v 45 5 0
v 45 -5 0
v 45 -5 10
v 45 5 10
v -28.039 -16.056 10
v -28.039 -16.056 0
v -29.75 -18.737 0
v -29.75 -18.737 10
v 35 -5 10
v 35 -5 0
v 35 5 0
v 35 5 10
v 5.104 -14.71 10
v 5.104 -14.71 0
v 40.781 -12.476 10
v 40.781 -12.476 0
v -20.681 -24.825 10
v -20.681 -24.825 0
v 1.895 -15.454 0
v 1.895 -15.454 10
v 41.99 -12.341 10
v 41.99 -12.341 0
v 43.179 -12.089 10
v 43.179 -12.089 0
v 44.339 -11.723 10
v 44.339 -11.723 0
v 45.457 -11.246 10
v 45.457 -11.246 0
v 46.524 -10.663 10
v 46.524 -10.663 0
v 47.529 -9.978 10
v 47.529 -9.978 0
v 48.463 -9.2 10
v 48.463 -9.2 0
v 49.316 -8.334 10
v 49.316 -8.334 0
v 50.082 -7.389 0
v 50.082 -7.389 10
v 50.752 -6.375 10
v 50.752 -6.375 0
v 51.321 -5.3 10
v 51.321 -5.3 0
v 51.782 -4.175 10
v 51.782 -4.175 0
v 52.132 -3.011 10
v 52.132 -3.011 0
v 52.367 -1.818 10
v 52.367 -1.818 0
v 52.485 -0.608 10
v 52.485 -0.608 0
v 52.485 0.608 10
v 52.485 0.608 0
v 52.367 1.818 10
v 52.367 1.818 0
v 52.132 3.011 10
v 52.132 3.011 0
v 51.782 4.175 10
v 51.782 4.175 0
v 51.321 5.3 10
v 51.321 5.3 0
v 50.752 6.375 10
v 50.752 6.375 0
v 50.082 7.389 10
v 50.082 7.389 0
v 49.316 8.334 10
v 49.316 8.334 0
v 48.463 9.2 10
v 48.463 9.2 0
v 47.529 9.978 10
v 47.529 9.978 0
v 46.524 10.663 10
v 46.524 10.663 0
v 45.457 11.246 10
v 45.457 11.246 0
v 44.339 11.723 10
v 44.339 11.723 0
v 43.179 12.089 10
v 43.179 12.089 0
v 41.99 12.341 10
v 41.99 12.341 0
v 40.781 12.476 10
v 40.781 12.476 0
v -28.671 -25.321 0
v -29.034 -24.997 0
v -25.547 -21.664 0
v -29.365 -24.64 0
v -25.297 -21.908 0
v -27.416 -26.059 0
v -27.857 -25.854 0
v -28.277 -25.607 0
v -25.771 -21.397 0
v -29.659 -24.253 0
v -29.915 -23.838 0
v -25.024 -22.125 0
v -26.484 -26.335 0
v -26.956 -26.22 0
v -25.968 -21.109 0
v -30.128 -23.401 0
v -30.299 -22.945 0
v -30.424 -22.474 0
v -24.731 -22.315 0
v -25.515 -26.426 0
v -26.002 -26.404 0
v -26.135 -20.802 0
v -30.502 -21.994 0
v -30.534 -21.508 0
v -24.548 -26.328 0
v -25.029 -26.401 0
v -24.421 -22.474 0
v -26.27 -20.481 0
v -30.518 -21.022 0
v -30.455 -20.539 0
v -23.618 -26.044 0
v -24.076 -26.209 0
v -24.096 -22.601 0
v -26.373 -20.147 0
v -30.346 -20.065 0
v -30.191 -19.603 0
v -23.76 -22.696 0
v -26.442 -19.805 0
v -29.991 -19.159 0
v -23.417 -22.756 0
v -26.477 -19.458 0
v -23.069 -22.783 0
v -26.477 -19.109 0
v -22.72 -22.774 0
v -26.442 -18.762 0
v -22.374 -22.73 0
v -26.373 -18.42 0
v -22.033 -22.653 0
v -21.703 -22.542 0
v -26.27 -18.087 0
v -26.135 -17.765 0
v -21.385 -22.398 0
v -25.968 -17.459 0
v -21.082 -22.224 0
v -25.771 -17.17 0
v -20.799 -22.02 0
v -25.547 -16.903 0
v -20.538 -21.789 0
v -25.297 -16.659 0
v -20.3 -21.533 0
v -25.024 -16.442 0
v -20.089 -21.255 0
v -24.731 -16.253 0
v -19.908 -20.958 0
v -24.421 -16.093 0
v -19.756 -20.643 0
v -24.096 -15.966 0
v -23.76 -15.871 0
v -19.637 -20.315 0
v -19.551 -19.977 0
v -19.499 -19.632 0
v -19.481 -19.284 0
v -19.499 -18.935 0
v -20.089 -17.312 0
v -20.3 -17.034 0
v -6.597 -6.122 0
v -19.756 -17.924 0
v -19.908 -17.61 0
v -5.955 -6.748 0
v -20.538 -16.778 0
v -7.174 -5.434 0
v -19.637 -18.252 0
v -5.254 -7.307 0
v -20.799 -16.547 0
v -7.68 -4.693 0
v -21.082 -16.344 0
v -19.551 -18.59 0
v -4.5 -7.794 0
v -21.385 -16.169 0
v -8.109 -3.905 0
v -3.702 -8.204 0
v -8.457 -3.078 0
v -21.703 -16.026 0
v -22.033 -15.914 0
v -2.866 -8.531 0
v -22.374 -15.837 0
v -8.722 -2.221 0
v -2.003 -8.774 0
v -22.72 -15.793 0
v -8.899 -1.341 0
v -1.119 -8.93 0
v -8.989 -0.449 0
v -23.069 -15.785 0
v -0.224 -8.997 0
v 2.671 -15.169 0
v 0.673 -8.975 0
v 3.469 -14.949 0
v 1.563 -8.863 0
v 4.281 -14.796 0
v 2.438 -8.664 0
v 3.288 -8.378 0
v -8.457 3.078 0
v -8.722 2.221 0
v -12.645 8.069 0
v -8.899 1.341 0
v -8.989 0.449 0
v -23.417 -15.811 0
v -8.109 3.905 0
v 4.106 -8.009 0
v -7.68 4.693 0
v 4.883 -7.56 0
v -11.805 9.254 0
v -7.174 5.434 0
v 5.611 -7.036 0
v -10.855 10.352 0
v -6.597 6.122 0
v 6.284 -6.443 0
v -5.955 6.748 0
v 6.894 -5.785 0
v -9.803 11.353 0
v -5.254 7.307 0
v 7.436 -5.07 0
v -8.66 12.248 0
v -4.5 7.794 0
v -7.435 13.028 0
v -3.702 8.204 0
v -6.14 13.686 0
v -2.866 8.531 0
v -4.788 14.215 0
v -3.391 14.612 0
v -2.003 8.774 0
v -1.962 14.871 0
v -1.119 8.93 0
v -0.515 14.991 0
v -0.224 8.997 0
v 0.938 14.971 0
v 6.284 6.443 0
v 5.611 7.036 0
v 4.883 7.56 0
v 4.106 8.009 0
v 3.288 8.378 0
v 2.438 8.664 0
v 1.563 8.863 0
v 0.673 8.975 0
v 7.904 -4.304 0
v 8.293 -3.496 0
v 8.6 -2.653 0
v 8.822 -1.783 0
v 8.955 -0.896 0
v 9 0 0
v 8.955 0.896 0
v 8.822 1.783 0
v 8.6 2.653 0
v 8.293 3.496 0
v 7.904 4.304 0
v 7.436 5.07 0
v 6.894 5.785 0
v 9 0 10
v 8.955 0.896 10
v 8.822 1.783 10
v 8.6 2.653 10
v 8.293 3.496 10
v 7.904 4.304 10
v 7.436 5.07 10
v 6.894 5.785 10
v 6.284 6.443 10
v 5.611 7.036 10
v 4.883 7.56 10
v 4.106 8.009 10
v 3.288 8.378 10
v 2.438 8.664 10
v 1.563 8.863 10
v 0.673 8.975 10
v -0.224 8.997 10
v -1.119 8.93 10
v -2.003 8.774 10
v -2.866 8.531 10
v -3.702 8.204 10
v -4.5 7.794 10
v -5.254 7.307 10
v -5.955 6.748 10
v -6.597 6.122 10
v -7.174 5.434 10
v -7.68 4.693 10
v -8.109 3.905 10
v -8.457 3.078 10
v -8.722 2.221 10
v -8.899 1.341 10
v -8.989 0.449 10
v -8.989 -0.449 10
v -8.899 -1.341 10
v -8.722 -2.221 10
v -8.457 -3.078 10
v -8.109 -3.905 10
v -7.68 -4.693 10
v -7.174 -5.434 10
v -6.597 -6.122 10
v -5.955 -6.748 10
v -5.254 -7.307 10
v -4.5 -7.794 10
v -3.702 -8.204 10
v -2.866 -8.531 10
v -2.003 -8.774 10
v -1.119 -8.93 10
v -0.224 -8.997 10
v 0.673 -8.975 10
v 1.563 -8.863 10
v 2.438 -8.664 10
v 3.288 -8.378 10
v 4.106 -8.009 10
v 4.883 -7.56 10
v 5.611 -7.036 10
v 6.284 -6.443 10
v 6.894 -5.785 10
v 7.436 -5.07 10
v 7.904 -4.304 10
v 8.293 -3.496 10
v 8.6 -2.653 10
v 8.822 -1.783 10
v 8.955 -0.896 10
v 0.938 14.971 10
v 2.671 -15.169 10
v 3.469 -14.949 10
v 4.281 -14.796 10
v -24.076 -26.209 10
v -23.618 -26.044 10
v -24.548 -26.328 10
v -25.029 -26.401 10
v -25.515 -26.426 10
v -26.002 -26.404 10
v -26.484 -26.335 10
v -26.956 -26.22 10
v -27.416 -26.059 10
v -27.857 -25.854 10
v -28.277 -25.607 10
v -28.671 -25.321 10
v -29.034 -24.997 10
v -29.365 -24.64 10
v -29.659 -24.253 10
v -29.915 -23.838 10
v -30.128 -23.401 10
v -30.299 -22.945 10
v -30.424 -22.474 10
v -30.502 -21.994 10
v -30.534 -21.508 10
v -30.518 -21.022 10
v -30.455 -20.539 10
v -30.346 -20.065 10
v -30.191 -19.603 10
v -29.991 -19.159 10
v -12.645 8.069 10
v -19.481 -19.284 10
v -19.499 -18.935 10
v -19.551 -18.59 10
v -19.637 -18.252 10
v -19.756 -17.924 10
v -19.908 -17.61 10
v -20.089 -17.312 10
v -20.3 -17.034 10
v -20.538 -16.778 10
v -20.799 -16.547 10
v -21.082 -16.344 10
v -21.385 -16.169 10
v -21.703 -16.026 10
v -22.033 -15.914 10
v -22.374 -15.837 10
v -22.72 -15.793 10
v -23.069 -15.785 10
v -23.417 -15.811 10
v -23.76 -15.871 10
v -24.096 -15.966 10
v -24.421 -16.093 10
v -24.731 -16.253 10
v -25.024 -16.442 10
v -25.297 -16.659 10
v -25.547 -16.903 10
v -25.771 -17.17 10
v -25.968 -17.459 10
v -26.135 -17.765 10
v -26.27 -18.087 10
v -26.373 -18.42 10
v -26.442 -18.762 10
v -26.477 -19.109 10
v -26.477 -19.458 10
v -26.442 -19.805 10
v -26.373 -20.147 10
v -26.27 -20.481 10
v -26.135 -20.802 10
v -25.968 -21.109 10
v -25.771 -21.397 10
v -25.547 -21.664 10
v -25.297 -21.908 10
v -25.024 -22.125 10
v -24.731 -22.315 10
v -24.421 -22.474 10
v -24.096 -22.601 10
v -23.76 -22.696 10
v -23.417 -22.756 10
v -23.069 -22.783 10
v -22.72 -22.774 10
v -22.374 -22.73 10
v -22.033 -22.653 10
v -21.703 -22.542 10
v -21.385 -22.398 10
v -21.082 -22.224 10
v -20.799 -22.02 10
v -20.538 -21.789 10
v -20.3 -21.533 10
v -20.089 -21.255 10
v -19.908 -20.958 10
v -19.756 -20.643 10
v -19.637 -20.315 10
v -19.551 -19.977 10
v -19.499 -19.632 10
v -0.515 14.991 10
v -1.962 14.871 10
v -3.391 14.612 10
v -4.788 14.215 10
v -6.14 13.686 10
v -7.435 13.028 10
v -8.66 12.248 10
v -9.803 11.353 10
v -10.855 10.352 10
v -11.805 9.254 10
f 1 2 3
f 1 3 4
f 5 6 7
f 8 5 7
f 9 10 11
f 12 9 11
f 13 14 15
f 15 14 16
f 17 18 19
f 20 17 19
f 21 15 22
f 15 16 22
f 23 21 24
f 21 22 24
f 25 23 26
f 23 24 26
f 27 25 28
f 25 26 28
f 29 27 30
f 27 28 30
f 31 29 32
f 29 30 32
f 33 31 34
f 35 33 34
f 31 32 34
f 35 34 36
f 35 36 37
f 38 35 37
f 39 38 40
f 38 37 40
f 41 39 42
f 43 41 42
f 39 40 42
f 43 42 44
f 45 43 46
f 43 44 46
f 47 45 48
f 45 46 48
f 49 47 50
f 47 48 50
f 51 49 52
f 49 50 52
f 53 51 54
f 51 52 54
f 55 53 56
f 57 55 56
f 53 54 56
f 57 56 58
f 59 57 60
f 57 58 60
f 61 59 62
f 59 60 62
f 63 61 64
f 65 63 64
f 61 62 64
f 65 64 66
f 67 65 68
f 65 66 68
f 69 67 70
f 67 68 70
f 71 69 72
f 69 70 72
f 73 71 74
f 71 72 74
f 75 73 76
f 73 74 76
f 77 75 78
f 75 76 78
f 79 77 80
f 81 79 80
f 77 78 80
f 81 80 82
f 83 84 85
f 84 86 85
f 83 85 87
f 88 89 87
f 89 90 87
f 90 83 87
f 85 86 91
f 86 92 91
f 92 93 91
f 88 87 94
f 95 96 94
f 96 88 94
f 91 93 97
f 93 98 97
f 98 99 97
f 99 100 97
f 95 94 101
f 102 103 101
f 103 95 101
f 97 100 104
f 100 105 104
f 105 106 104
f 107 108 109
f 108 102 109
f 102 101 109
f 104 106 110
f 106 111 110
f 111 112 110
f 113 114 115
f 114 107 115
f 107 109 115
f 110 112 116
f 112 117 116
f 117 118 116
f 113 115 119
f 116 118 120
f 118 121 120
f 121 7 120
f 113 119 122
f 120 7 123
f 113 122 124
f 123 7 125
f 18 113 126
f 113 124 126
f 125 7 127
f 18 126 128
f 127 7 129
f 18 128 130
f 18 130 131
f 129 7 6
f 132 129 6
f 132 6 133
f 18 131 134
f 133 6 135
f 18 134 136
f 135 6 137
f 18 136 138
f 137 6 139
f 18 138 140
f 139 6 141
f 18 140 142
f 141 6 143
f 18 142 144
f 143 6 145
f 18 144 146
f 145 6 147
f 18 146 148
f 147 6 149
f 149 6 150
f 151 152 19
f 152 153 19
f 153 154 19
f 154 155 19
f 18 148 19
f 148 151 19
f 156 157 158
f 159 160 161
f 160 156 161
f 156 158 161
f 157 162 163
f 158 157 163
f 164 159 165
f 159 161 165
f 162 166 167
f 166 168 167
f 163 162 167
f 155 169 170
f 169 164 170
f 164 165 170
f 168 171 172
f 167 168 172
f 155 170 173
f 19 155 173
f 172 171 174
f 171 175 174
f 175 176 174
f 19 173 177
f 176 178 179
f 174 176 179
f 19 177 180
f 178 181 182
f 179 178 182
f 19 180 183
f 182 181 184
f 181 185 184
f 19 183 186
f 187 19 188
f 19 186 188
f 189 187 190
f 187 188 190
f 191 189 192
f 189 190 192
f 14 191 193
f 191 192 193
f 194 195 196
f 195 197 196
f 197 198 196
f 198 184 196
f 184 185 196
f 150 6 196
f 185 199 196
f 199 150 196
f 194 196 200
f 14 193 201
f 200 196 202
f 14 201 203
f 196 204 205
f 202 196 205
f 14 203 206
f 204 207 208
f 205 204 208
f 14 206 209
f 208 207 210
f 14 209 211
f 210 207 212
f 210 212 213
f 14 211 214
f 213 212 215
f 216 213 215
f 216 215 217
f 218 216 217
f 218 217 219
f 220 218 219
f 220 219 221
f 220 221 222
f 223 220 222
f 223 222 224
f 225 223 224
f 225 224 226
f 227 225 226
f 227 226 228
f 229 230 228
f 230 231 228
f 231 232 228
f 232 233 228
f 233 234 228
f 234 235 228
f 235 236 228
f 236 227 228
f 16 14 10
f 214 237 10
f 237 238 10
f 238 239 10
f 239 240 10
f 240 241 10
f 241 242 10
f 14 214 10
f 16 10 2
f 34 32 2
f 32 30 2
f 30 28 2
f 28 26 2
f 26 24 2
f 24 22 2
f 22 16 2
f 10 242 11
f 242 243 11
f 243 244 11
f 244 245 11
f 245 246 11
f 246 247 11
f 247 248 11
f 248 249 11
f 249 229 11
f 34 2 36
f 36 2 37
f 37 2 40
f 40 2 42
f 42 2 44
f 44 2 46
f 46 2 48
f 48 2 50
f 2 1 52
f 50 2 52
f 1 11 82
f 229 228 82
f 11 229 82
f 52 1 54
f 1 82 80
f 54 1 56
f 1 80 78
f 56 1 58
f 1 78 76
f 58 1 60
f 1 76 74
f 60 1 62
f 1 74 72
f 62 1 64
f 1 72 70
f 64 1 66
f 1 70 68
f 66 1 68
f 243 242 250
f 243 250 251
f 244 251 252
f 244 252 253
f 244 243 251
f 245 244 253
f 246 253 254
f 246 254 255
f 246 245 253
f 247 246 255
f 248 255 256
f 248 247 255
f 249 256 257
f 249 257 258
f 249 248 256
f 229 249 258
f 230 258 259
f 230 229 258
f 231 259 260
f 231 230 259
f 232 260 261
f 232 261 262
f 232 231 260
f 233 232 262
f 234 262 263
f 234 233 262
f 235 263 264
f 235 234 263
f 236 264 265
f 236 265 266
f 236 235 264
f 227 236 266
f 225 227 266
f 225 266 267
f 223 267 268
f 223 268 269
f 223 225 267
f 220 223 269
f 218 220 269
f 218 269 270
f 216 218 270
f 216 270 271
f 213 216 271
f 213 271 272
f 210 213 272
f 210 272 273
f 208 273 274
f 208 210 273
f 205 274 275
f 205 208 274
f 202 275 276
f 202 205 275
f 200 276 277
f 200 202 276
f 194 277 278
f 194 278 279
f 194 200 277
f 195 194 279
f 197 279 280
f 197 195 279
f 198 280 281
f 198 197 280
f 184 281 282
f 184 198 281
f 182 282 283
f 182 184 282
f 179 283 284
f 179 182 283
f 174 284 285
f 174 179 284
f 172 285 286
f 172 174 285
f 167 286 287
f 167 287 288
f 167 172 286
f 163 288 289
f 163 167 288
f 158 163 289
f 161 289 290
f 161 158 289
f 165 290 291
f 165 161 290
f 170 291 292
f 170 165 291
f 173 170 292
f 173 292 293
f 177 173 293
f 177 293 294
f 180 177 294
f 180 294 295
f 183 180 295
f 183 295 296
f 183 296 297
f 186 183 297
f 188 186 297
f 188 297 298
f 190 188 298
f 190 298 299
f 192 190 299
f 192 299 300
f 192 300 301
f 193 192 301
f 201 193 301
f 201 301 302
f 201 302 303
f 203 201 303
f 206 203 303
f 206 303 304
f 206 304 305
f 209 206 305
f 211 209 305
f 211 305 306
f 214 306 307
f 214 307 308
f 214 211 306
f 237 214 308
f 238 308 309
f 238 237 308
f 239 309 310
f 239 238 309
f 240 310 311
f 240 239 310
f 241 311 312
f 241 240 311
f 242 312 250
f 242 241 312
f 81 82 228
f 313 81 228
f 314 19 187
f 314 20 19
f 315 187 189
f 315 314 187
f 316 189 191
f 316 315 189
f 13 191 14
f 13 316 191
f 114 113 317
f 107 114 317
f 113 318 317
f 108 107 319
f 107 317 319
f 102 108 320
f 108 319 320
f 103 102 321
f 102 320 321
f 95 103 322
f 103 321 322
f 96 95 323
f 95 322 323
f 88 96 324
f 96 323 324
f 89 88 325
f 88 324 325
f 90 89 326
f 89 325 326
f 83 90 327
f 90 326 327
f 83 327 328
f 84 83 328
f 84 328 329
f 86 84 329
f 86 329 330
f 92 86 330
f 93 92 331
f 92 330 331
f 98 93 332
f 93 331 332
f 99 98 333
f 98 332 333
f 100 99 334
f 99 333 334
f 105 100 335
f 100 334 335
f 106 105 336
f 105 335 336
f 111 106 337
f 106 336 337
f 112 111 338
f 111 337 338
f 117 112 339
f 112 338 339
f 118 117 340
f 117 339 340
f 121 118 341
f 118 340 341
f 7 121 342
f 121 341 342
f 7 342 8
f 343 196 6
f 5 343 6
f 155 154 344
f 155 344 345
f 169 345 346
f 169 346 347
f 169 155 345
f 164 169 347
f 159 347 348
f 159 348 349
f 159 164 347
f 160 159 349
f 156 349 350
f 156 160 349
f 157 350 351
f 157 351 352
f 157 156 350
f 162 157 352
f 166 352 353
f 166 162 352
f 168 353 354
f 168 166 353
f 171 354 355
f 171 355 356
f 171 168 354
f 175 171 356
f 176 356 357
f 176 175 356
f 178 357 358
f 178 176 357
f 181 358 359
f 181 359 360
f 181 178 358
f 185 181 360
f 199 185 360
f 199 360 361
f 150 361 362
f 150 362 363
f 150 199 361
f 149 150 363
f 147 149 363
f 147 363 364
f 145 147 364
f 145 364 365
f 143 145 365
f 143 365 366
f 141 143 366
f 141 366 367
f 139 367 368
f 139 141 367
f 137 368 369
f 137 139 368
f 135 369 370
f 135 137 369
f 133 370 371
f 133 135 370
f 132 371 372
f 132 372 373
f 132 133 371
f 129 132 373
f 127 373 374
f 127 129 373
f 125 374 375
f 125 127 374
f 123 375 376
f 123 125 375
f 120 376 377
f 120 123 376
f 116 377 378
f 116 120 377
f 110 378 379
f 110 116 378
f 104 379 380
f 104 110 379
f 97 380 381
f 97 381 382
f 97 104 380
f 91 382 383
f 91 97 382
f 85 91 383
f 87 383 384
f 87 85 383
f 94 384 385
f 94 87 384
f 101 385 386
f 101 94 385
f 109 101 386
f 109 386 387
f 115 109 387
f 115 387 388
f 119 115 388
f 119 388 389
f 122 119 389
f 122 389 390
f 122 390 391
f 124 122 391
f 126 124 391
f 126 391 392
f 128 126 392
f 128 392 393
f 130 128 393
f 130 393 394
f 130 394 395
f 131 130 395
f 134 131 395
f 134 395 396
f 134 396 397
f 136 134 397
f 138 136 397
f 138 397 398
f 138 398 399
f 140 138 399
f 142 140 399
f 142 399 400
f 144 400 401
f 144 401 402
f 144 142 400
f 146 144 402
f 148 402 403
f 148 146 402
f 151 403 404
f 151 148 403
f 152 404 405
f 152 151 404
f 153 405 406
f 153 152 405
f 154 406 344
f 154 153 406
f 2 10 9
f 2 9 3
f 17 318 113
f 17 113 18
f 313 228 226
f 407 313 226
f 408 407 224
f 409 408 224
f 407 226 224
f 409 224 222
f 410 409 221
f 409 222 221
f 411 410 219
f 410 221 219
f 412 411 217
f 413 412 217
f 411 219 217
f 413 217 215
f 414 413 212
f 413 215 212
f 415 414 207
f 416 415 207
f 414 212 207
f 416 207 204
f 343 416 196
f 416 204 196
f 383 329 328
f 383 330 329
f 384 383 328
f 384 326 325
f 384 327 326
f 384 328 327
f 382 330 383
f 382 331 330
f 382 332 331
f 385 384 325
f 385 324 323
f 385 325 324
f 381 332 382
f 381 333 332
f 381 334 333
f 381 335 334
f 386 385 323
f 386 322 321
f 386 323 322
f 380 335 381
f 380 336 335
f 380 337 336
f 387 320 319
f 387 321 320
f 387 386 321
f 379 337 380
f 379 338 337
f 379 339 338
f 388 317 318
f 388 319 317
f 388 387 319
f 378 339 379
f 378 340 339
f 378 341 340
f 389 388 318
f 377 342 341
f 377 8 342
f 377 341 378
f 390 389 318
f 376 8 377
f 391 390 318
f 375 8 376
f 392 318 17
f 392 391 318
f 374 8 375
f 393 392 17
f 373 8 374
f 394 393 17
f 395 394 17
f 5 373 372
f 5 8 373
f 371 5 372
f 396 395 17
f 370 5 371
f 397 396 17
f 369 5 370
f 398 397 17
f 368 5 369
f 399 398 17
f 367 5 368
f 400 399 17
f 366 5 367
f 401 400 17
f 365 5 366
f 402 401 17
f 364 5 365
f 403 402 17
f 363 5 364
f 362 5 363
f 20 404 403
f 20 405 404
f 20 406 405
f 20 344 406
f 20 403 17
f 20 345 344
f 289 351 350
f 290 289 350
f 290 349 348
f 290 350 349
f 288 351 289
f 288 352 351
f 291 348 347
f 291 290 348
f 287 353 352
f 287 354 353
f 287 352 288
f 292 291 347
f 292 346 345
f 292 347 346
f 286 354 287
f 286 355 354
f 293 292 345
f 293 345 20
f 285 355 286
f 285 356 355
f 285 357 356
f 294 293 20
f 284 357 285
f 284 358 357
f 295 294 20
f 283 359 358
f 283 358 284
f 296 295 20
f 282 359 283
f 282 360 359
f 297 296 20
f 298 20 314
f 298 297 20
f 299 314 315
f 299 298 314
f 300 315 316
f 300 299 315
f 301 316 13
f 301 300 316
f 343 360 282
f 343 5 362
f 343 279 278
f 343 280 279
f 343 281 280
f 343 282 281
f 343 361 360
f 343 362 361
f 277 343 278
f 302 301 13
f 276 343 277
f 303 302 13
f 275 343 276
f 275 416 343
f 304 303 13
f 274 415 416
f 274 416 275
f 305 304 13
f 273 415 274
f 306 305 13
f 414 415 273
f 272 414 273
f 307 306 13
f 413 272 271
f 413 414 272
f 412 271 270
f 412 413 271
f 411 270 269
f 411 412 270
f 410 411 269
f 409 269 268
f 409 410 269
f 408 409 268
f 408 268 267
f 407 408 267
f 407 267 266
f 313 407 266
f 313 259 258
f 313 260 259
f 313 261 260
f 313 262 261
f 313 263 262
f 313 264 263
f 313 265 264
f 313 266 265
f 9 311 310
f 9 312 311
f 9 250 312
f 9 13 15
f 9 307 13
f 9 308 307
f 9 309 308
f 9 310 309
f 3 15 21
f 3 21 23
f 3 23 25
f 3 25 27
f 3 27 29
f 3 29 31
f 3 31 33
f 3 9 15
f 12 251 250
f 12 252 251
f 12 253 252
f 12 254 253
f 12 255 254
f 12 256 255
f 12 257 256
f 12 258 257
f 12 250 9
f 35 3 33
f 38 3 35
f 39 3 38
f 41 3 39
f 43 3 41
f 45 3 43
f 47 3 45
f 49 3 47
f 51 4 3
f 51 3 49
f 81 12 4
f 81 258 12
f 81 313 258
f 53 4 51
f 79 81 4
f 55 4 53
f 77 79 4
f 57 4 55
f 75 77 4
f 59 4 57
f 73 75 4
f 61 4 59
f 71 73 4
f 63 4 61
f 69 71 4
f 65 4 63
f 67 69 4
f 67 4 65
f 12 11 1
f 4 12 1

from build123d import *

# Parameters (mm, degrees)
SKETCH_1_R      = 6
SKETCH_1_R_2    = 3.5
SKETCH_1_R_3    = 15
SKETCH_1_R_4    = 9
SKETCH_1_R_5    = 12.5
SKETCH_1_W      = 10
SKETCH_1_H      = 10
EXTRUDE_1_DEPTH = 10
FILLET_1_R      = 5
FILLET_2_R      = 10


with BuildPart() as part:
    # Эскиз1 → Бобышка-Вытянуть1 (new body)
    # profile 1 of 7: a face of its own
    with BuildSketch(Plane.XY):
        with BuildLine():
            Line((-12.64490448, 8.068853121), (-28.039295072, -16.056087022))
            ThreePointArc((-28.039295072, -16.056087022), (-21.300228103, -13.523950753), (-16.981333294, -19.283628291))
            ThreePointArc((-16.981333294, -19.283628291), (-17.991282662, -22.615203698), (-20.681131524, -24.825204945))
            Line((-20.681131524, -24.825204945), (3.437235755, -14.814134934))
            Line((3.437235755, -14.814134934), (0.9375, -14.970674459))
            ThreePointArc((0.9375, -14.970674459), (-12.921717676, -7.617690746), (-12.64490448, 8.068853121))
        make_face()
    # profile 2 of 7: a face of its own
    with BuildSketch(Plane.XY):
        with Locations((-22.981333294, -19.283628291)):
            Circle(SKETCH_1_R)
        with Locations((-22.981333294, -19.283628291)):
            Circle(SKETCH_1_R_2, mode=Mode.SUBTRACT)
    # profile 3 of 7: a face of its own
    with BuildSketch(Plane.XY):
        with BuildLine():
            Line((-28.039295072, -16.056087022), (-38.302222156, -32.139380484))
            Line((-38.302222156, -32.139380484), (-20.681131524, -24.825204945))
            ThreePointArc((-20.681131524, -24.825204945), (-27.57759997, -23.140353928), (-28.039295072, -16.056087022))
        make_face()
    # profile 4 of 7: a face of its own
    with BuildSketch(Plane.XY):
        Circle(SKETCH_1_R_3)
        Circle(SKETCH_1_R_4, mode=Mode.SUBTRACT)
    # profile 5 of 7: a face of its own
    with BuildSketch(Plane.XY):
        with BuildLine():
            Line((5.750504492, -13.853941608), (3.437235755, -14.814134934))
            Line((3.437235755, -14.814134934), (40.78125, -12.475562049))
            ThreePointArc((40.78125, -12.475562049), (27.5, 0), (40.78125, 12.475562049))
            Line((40.78125, 12.475562049), (0.9375, 14.970674459))
            ThreePointArc((0.9375, 14.970674459), (10.933034803, 10.269797953), (15, 0))
            ThreePointArc((15, 0), (12.4751266, -8.328938486), (5.750504492, -13.853941608))
        make_face()
    # profile 6 of 7: a face of its own
    with BuildSketch(Plane.XY):
        with Locations((40, 0)):
            Circle(SKETCH_1_R_5)
        with Locations((40, 0)):
            Rectangle(SKETCH_1_W, SKETCH_1_H, mode=Mode.SUBTRACT)
    # profile 7 of 7: a face of its own
    with BuildSketch(Plane.XY):
        with BuildLine():
            Line((0.9375, -14.970674459), (3.437235755, -14.814134934))
            Line((3.437235755, -14.814134934), (5.750504492, -13.853941608))
            ThreePointArc((5.750504492, -13.853941608), (3.390298525, -14.611840264), (0.9375, -14.970674459))
        make_face()
    extrude(amount=EXTRUDE_1_DEPTH)

    # Скругление1
    fillet_1_edges = [part.edges().sort_by_distance(p)[0] for p in [
        (-38.302222156, -32.139380484, 5),
    ]]
    fillet(fillet_1_edges, radius=FILLET_1_R)

    # Скругление2
    fillet_2_edges = [part.edges().sort_by_distance(p)[0] for p in [
        (3.437235755, -14.814134934, 5),
    ]]
    fillet(fillet_2_edges, radius=FILLET_2_R)


solid = part.part
